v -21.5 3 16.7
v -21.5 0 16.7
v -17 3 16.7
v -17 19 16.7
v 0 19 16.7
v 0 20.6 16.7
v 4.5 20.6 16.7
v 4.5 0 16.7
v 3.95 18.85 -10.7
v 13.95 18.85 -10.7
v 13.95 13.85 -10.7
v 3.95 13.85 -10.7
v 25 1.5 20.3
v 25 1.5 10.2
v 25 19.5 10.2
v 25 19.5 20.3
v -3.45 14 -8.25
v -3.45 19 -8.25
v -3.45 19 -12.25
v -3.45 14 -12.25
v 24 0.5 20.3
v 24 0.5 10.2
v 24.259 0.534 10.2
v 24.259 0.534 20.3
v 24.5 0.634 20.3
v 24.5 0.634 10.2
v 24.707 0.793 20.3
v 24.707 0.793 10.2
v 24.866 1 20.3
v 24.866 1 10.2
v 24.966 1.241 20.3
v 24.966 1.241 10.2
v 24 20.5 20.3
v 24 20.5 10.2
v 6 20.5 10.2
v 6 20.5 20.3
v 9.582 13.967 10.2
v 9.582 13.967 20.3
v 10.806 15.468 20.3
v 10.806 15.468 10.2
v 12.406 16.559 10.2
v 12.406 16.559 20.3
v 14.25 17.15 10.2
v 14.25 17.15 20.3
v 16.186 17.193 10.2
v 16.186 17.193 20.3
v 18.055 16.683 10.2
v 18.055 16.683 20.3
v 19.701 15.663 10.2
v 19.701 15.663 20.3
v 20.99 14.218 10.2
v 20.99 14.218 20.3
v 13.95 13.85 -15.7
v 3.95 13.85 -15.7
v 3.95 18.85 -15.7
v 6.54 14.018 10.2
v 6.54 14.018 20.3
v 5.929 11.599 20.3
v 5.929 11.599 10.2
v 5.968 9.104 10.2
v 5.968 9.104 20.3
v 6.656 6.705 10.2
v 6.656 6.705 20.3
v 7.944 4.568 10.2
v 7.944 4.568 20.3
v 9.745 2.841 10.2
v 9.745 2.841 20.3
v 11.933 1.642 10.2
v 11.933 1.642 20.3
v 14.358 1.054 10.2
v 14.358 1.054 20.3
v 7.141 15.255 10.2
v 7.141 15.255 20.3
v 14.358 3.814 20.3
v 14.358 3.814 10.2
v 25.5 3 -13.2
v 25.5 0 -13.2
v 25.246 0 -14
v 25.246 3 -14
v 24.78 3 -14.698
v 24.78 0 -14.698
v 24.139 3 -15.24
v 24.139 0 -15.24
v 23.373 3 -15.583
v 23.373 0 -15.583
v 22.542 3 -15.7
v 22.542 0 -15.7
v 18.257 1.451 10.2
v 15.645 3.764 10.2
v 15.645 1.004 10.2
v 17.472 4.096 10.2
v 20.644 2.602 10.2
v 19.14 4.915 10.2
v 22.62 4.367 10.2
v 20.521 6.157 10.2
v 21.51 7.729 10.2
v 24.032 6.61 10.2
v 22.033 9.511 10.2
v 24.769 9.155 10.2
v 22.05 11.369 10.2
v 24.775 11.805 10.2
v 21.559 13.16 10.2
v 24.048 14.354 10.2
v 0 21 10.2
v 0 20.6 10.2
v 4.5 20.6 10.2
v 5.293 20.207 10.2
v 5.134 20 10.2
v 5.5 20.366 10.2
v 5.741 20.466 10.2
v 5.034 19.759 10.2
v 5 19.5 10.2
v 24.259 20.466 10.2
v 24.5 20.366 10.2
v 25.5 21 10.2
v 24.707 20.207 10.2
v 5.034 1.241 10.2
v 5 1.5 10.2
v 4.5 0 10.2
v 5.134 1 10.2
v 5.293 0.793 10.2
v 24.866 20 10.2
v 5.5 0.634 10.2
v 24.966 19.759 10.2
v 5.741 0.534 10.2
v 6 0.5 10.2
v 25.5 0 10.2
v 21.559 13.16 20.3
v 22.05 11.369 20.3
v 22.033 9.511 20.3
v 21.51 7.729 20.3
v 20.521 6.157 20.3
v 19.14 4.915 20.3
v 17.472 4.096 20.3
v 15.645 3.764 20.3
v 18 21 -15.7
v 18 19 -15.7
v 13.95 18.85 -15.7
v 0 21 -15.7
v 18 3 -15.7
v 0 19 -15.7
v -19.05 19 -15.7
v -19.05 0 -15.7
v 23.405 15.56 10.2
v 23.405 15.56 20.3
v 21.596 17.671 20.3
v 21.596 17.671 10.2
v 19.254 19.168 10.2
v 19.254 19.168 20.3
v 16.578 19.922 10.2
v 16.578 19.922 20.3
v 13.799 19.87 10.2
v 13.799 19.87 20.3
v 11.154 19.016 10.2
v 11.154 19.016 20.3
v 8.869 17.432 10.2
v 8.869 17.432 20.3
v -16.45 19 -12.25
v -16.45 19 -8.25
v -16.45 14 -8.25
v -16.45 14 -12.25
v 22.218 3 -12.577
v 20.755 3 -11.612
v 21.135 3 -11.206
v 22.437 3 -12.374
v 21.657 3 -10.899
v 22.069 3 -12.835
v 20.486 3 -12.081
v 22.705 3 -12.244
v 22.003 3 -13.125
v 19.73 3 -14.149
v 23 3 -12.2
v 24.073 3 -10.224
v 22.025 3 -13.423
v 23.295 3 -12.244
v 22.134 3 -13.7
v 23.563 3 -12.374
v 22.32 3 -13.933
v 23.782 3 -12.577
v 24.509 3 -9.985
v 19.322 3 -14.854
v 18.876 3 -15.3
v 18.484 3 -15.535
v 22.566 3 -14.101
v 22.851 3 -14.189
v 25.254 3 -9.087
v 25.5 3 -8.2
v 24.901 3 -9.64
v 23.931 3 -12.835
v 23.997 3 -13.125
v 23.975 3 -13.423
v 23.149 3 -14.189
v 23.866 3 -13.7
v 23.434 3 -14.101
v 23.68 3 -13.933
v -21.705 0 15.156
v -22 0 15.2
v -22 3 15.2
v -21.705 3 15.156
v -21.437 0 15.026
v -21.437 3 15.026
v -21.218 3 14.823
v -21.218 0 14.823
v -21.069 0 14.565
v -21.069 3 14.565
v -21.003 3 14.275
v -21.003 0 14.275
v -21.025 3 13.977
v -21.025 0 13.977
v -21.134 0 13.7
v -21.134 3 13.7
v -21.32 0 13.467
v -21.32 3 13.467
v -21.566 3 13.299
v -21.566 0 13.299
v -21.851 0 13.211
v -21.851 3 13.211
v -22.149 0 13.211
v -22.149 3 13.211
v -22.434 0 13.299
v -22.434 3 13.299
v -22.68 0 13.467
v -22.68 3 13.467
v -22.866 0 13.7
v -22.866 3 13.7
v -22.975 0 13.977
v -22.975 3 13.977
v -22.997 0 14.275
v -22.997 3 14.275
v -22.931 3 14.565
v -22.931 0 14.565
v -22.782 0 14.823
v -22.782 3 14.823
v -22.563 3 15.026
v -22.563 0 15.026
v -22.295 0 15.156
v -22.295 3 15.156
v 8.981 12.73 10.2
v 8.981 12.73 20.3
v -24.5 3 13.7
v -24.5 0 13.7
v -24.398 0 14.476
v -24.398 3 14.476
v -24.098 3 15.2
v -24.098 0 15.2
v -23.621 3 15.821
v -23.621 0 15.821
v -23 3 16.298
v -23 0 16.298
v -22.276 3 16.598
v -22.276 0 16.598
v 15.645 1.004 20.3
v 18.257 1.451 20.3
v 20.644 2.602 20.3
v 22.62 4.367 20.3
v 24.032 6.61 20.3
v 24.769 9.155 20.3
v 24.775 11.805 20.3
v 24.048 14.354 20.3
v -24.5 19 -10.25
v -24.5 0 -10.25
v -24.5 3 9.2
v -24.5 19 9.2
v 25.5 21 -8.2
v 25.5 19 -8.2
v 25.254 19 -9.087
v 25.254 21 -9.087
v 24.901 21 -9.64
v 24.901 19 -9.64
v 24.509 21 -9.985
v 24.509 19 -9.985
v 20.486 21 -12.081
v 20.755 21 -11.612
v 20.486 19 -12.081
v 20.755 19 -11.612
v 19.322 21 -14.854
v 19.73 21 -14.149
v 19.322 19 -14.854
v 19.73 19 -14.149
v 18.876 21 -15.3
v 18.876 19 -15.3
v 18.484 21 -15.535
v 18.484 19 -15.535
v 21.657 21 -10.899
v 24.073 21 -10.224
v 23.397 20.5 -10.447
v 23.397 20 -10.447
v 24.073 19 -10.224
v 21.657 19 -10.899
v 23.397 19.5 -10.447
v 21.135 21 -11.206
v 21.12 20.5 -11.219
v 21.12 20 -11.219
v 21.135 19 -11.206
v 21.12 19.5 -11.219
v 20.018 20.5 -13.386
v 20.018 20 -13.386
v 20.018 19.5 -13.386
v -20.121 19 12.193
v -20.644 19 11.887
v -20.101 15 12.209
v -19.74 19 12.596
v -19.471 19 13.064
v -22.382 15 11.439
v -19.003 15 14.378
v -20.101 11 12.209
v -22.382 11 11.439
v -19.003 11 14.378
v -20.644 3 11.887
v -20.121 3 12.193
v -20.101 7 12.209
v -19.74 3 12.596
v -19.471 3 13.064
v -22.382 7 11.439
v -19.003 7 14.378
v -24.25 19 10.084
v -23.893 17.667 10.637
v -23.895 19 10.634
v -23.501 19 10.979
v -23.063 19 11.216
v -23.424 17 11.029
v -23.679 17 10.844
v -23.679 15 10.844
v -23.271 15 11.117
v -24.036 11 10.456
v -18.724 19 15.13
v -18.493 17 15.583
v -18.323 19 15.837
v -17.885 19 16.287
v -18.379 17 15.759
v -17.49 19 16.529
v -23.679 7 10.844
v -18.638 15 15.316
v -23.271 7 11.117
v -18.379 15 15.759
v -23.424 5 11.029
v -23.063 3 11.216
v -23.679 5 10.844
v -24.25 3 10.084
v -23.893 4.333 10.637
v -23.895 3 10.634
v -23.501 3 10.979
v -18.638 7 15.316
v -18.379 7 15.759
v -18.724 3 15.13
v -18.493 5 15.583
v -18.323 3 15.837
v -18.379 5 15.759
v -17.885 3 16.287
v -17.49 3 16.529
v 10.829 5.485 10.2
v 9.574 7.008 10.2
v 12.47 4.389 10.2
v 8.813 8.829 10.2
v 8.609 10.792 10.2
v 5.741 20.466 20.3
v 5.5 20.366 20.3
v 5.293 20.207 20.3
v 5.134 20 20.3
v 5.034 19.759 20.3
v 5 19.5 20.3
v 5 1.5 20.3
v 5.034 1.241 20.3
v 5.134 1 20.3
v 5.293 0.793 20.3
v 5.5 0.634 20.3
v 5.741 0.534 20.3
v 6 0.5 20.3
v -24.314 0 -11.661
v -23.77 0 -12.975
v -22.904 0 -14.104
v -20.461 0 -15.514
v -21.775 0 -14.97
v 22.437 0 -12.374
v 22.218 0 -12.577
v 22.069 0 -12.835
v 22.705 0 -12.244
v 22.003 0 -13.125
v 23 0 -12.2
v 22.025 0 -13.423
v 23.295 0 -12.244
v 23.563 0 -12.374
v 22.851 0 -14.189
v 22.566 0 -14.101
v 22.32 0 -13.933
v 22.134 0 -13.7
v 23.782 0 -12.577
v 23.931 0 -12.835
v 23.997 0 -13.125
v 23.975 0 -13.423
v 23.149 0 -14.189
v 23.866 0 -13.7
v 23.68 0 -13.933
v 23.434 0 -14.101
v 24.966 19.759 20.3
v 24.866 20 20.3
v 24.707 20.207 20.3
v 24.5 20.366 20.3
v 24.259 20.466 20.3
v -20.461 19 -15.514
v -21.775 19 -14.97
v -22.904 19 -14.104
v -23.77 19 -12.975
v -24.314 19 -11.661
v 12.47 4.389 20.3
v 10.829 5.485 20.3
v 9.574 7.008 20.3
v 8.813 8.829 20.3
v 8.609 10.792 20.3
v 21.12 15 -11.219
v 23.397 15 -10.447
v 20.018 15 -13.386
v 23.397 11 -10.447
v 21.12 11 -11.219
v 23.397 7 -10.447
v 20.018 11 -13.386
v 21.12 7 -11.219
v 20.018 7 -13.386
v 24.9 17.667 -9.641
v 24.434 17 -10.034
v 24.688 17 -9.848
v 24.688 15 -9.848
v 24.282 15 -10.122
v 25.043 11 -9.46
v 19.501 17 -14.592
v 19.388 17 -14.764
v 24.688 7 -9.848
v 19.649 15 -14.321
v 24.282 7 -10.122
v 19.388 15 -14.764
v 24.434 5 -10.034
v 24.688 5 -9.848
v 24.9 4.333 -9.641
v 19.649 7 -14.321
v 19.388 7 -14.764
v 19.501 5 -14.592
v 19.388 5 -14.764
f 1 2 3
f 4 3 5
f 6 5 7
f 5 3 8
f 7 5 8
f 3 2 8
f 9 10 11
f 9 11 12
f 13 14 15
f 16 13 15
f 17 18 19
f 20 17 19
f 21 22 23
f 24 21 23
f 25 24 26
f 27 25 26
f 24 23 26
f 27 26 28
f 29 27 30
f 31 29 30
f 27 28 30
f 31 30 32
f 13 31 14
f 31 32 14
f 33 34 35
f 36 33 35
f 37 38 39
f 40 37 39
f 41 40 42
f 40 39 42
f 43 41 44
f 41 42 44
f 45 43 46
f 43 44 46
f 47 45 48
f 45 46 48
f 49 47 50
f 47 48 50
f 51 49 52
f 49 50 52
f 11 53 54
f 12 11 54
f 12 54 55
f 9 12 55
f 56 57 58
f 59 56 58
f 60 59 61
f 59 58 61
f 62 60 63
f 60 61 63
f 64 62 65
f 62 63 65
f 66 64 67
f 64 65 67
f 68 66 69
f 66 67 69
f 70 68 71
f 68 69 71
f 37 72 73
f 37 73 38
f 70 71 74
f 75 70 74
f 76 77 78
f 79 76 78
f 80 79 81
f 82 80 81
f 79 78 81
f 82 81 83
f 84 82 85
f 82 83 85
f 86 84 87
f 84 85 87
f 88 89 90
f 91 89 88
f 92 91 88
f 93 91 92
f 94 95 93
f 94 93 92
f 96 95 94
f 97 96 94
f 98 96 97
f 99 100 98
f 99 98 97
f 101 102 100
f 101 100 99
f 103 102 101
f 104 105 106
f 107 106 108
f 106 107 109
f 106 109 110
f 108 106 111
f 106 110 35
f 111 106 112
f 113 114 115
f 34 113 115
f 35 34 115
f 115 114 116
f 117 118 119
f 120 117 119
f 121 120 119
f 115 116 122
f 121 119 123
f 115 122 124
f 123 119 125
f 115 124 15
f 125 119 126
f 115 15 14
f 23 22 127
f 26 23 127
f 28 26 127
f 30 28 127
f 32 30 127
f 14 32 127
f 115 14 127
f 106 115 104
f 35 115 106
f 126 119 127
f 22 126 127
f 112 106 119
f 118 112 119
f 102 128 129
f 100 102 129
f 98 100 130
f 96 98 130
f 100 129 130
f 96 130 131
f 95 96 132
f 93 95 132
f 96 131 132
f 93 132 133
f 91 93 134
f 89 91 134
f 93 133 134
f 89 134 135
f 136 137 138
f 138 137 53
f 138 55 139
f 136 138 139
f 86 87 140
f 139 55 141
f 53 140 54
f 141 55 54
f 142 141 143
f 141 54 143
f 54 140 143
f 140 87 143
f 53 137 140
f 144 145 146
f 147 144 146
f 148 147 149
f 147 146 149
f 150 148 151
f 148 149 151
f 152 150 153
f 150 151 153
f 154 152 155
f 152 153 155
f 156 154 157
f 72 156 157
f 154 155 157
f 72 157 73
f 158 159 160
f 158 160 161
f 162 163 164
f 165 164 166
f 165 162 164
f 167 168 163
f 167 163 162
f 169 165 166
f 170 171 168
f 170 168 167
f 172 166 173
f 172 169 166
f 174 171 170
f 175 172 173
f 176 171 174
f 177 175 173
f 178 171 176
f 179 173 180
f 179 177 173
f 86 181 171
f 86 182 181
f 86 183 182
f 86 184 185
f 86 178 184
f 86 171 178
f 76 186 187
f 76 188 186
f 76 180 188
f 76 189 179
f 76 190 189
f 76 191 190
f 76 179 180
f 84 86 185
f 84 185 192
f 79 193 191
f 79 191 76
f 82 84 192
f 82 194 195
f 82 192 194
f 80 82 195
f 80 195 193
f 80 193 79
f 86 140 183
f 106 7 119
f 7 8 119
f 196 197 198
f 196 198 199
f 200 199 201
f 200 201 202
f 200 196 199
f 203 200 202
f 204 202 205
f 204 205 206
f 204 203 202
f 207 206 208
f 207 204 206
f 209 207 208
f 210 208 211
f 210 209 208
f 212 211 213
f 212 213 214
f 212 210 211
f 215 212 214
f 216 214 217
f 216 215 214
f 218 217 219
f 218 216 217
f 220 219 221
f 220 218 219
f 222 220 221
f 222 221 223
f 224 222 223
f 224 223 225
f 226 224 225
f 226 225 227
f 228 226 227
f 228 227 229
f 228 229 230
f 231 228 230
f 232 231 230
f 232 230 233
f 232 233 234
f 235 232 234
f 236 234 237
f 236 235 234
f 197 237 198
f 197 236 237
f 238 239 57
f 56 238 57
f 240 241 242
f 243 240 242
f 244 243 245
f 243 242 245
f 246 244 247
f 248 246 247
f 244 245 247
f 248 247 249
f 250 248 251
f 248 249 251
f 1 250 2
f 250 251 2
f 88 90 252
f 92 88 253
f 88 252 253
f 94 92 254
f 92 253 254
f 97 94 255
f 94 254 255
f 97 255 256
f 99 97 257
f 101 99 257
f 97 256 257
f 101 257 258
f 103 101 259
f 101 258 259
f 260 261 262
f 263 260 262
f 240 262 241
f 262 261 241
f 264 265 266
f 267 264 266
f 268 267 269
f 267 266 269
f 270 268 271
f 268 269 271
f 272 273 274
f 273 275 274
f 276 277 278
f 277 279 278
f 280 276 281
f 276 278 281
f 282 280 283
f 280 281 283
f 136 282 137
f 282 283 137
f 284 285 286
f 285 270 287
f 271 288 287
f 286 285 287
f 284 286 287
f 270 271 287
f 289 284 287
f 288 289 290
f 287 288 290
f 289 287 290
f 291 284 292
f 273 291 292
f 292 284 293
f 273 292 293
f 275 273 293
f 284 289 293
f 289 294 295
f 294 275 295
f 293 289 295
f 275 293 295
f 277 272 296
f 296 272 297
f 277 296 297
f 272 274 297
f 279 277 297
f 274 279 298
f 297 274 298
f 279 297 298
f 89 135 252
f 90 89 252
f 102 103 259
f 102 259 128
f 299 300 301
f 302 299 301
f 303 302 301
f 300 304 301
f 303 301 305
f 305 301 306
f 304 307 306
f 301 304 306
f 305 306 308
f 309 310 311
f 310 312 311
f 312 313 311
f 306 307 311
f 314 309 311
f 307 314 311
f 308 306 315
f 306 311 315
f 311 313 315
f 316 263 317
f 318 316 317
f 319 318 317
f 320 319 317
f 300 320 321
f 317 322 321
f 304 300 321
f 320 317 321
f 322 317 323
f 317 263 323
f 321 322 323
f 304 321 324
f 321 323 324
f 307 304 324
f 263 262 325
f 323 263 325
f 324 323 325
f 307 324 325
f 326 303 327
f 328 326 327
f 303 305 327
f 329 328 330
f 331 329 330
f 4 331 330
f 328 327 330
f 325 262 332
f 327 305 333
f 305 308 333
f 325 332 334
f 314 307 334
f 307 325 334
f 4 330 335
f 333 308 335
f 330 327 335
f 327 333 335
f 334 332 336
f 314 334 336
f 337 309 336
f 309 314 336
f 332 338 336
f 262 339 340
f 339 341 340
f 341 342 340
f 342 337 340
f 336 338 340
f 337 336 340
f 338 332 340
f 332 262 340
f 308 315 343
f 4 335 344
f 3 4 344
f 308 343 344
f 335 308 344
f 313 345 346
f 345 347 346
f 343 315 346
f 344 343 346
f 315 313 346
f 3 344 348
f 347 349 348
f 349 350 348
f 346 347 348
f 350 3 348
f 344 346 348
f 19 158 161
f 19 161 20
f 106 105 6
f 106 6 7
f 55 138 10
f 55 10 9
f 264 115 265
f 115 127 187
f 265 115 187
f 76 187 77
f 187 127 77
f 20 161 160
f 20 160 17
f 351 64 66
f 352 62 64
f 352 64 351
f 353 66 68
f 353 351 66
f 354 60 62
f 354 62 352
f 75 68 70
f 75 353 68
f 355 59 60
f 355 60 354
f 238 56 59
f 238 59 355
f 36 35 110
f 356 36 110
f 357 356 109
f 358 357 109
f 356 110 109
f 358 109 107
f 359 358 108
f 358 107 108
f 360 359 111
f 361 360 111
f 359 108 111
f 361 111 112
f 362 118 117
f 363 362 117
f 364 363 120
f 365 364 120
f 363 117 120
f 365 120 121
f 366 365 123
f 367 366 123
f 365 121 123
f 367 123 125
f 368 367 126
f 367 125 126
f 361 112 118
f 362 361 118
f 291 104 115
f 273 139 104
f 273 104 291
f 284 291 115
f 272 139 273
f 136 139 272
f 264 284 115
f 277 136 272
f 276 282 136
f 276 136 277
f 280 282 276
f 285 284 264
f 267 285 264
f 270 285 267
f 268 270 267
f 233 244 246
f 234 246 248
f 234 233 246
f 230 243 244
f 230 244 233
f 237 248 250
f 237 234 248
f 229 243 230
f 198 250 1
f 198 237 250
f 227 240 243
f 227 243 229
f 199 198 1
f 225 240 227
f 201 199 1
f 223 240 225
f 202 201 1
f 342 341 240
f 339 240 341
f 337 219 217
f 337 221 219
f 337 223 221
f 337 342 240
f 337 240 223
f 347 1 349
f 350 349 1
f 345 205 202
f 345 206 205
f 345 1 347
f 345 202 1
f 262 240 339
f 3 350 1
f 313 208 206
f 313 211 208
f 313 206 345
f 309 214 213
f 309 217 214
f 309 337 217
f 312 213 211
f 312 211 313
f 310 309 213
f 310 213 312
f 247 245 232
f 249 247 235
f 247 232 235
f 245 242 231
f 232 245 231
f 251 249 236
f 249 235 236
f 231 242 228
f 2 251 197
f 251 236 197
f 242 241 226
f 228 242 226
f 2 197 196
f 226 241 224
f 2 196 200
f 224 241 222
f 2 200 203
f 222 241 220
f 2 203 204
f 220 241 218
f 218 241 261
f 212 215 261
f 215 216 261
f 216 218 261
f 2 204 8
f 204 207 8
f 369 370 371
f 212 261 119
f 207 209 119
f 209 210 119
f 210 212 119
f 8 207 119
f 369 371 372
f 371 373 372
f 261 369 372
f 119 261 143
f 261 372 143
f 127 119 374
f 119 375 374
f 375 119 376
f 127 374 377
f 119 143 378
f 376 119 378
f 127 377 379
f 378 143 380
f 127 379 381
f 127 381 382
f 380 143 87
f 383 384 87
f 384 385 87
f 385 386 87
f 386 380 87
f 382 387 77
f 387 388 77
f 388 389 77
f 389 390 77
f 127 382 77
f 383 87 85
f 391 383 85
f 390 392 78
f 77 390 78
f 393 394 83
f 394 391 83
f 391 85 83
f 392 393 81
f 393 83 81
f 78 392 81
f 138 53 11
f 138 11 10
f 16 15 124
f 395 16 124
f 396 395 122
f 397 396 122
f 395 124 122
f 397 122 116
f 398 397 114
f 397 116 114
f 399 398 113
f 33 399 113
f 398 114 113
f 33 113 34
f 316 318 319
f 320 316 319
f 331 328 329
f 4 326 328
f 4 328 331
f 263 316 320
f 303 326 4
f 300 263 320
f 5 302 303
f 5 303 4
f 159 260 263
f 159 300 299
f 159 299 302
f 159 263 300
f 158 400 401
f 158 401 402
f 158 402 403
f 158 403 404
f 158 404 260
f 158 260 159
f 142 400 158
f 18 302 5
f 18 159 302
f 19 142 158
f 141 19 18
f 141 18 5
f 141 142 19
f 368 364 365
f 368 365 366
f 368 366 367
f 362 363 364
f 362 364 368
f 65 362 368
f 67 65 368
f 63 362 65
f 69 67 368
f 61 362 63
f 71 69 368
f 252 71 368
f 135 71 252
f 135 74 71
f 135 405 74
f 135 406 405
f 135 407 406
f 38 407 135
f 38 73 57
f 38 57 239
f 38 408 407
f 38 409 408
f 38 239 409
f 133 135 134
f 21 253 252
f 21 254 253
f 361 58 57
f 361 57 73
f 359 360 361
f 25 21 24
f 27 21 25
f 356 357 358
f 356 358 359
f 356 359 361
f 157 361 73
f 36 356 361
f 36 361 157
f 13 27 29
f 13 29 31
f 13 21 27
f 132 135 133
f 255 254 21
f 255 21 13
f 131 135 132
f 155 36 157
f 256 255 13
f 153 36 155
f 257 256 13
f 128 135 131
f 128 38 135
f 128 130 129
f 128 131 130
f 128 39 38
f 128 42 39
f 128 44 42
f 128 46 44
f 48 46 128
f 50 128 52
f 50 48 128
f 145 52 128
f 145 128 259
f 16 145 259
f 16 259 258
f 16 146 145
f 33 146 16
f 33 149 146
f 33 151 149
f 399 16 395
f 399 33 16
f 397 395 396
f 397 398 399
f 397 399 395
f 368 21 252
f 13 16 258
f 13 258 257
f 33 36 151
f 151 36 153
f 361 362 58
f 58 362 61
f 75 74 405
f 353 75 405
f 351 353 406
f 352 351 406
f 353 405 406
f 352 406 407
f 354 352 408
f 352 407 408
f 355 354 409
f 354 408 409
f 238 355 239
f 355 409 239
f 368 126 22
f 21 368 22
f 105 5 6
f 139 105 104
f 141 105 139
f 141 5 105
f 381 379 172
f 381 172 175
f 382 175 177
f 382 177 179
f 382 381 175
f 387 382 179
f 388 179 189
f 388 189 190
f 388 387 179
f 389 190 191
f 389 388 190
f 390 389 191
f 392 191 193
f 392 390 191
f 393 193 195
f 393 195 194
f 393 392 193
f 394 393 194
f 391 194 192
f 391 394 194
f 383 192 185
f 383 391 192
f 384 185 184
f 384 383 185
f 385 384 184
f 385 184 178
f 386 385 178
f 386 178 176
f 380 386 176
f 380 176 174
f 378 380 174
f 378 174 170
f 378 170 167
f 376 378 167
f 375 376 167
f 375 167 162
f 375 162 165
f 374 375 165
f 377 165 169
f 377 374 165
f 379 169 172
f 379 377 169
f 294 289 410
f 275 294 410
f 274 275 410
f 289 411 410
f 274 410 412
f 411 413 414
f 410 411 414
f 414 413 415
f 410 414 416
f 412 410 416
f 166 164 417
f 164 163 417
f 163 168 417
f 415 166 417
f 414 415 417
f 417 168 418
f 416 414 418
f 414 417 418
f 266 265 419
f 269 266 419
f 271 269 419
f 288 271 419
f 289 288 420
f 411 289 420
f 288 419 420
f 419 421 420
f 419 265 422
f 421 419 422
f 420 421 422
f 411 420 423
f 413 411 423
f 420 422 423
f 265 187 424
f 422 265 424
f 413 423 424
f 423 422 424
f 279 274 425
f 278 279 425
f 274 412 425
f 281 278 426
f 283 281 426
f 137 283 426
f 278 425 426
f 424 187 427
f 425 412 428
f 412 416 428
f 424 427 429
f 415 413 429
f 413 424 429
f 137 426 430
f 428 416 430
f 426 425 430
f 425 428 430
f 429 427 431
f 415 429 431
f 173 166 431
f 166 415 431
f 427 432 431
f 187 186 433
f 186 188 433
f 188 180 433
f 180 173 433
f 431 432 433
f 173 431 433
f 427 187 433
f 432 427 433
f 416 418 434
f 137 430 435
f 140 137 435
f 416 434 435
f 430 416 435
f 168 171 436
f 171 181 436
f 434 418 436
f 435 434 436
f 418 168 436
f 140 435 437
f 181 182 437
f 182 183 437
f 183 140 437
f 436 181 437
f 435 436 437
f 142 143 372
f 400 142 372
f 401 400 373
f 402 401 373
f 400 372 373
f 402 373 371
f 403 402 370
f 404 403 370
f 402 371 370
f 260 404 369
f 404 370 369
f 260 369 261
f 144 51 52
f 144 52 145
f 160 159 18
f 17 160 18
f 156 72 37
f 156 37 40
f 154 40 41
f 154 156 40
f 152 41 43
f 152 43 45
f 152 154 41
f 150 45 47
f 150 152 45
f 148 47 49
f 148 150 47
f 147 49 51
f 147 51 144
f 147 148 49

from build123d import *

# Parameters (mm, degrees)
SKETCH1_R           = 1
BOSS_EXTRUDE1_DEPTH = 3
BOSS_EXTRUDE2_DEPTH = 16
BOSS_EXTRUDE3_DEPTH = 2
SKETCH4_W           = 4.5
SKETCH4_H           = 6.5
BOSS_EXTRUDE4_DEPTH = 1.6
BOSS_EXTRUDE5_DEPTH = 10.1
CUT_EXTRUDE1_DEPTH  = 10.1
SKETCH8_W           = 13
SKETCH8_H           = 4
CUT_EXTRUDE2_DEPTH  = 5
SKETCH9_W           = 10
SKETCH9_H           = 5
CUT_EXTRUDE3_DEPTH  = 5


# Read off the part's stored shape, not the designer's step: Boss-Extrude2
with BuildPart() as part:
    # Sketch1 → Boss-Extrude1 (new body)
    with BuildSketch(Plane(origin=(0, 0, 0), x_dir=(1, 0, 0), z_dir=(0, 1, 0))):
        with BuildLine():
            Line((4.5, -16.7), (4.5, -10.2))
            Line((4.5, -10.2), (25.5, -10.2))
            Line((25.5, -10.2), (25.5, 13.2))
            ThreePointArc((25.5, 13.2), (24.478451782, 14.991287847), (22.541960108, 15.7))
            Line((22.541960108, 15.7), (-19.05, 15.7))
            ThreePointArc((-19.05, 15.7), (-22.903731957, 14.103731957), (-24.5, 10.25))
            Line((-24.5, 10.25), (-24.5, -13.7))
            ThreePointArc((-24.5, -13.7), (-23.621320344, -15.821320344), (-21.5, -16.7))
            Line((-21.5, -16.7), (4.5, -16.7))
        make_face()
        with Locations(Location((23, 13.2, 0), (0, 0, 270))):
            Circle(SKETCH1_R, mode=Mode.SUBTRACT)
        with Locations(Location((-22, -14.2, 0), (0, 0, 270))):
            Circle(SKETCH1_R, mode=Mode.SUBTRACT)
    extrude(amount=BOSS_EXTRUDE1_DEPTH)

    # Boss-Extrude2 outline → Boss-Extrude2 (add)
    with BuildSketch(Plane(origin=(0, 3, 0), x_dir=(1, 0, 0), z_dir=(0, 1, 0))):
        with BuildLine():
            Line((-24.5, 10.25), (-24.5, -9.2))
            add(Edge.make_bspline(
                [(-24.5, -9.2), (-23.769282577, -14.160806345), (-16.834317029, -8.300272079), (-21.009947693, -15.748034375), (-17, -16.7)],
                knots=[0, 0, 0, 0, 0, 1, 1, 1, 1, 1], degree=4))
            Line((-17, -16.7), (4.5, -16.7))
            Line((4.5, -16.7), (4.5, -10.2))
            Line((4.5, -10.2), (25.5, -10.2))
            Line((25.5, -10.2), (25.5, 8.2))
            add(Edge.make_bspline(
                [(25.5, 8.2), (24.79086606, 13.172227374), (17.855900512, 7.311693108), (22.031531177, 14.759455405), (18, 15.7)],
                knots=[0, 0, 0, 0, 0, 1, 1, 1, 1, 1], degree=4))
            Line((18, 15.7), (-19.05, 15.7))
            ThreePointArc((-19.05, 15.7), (-22.903731957, 14.103731957), (-24.5, 10.25))
        make_face()
    extrude(amount=BOSS_EXTRUDE2_DEPTH)

    # Sketch3 → Boss-Extrude3 (add)
    with BuildSketch(Plane(origin=(0, 19, 0), x_dir=(1, 0, 0), z_dir=(0, 1, 0))):
        with BuildLine():
            Line((25.5, -10.2), (25.5, 8.2))
            add(Edge.make_bspline(
                [(25.5, 8.2), (24.79086606, 13.172227374), (17.855900512, 7.311693108), (22.031531177, 14.759455405), (18, 15.7)],
                knots=[0, 0, 0, 0, 0, 1, 1, 1, 1, 1], degree=4))
            Line((18, 15.7), (0, 15.7))
            Line((0, 15.7), (0, -10.2))
            Line((0, -10.2), (25.5, -10.2))
        make_face()
    extrude(amount=BOSS_EXTRUDE3_DEPTH)

    # Sketch4 → Boss-Extrude4 (add)
    with BuildSketch(Plane(origin=(0, 19, 0), x_dir=(1, 0, 0), z_dir=(0, 1, 0))):
        with Locations((2.25, -13.45)):
            Rectangle(SKETCH4_W, SKETCH4_H)
    extrude(amount=BOSS_EXTRUDE4_DEPTH)

    # Sketch5 → Boss-Extrude5 (add)
    with BuildSketch(Plane.XY.offset(10.2)):
        with BuildLine():
            Line((6, 0.5), (24, 0.5))
            ThreePointArc((24, 0.5), (24.707106781, 0.792893219), (25, 1.5))
            Line((25, 1.5), (25, 19.5))
            ThreePointArc((25, 19.5), (24.707106781, 20.207106781), (24, 20.5))
            Line((24, 20.5), (6, 20.5))
            ThreePointArc((6, 20.5), (5.292893219, 20.207106781), (5, 19.5))
            Line((5, 19.5), (5, 1.5))
            ThreePointArc((5, 1.5), (5.292893219, 0.792893219), (6, 0.5))
        make_face()
    extrude(amount=BOSS_EXTRUDE5_DEPTH)

    # Sketch7 → Cut-Extrude1 (cut)
    with BuildSketch(Plane.XY.offset(20.3)):
        with BuildLine():
            Line((14.357886119, 1.053511456), (14.357886119, 3.813652456))
            ThreePointArc((14.357886119, 3.813652456), (9.574356132, 7.008298347), (8.98130736, 12.729855361))
            Line((8.98130736, 12.729855361), (6.540165326, 14.017955408))
            ThreePointArc((6.540165326, 14.017955408), (7.229438492, 5.594282327), (14.357886119, 1.053511456))
        make_face()
        with BuildLine():
            Line((7.140555489, 15.255205238), (9.581697527, 13.967105189))
            ThreePointArc((9.581697527, 13.967105189), (15.216789935, 17.241147229), (20.990144219, 14.217573506))
            Line((20.990144219, 14.217573506), (23.405000511, 15.560138833))
            ThreePointArc((23.405000511, 15.560138833), (15.186710134, 19.998330789), (7.140555489, 15.255205238))
        make_face()
        with BuildLine():
            Line((24.047997852, 14.353815082), (21.559268085, 13.160247955))
            ThreePointArc((21.559268085, 13.160247955), (21.07012739, 6.908676596), (15.644806916, 3.764268729))
            Line((15.644806916, 3.764268729), (15.644806916, 1.004127729))
            ThreePointArc((15.644806916, 1.004127729), (23.404589952, 5.439208876), (24.047997852, 14.353815082))
        make_face()
    extrude(amount=-CUT_EXTRUDE1_DEPTH, mode=Mode.SUBTRACT)

    # Sketch8 → Cut-Extrude2 (cut)
    with BuildSketch(Plane(origin=(0, 19, 0), x_dir=(1, 0, 0), z_dir=(0, 1, 0))):
        with Locations((-9.95, 10.25)):
            Rectangle(SKETCH8_W, SKETCH8_H)
    extrude(amount=-CUT_EXTRUDE2_DEPTH, mode=Mode.SUBTRACT)

    # Sketch9 → Cut-Extrude3 (cut)
    with BuildSketch(Plane(origin=(0, 0, -15.7), x_dir=(-1, 0, 0), z_dir=(0, 0, -1))):
        with Locations((-8.95, 16.35)):
            Rectangle(SKETCH9_W, SKETCH9_H)
    extrude(amount=-CUT_EXTRUDE3_DEPTH, mode=Mode.SUBTRACT)


solid = part.part
